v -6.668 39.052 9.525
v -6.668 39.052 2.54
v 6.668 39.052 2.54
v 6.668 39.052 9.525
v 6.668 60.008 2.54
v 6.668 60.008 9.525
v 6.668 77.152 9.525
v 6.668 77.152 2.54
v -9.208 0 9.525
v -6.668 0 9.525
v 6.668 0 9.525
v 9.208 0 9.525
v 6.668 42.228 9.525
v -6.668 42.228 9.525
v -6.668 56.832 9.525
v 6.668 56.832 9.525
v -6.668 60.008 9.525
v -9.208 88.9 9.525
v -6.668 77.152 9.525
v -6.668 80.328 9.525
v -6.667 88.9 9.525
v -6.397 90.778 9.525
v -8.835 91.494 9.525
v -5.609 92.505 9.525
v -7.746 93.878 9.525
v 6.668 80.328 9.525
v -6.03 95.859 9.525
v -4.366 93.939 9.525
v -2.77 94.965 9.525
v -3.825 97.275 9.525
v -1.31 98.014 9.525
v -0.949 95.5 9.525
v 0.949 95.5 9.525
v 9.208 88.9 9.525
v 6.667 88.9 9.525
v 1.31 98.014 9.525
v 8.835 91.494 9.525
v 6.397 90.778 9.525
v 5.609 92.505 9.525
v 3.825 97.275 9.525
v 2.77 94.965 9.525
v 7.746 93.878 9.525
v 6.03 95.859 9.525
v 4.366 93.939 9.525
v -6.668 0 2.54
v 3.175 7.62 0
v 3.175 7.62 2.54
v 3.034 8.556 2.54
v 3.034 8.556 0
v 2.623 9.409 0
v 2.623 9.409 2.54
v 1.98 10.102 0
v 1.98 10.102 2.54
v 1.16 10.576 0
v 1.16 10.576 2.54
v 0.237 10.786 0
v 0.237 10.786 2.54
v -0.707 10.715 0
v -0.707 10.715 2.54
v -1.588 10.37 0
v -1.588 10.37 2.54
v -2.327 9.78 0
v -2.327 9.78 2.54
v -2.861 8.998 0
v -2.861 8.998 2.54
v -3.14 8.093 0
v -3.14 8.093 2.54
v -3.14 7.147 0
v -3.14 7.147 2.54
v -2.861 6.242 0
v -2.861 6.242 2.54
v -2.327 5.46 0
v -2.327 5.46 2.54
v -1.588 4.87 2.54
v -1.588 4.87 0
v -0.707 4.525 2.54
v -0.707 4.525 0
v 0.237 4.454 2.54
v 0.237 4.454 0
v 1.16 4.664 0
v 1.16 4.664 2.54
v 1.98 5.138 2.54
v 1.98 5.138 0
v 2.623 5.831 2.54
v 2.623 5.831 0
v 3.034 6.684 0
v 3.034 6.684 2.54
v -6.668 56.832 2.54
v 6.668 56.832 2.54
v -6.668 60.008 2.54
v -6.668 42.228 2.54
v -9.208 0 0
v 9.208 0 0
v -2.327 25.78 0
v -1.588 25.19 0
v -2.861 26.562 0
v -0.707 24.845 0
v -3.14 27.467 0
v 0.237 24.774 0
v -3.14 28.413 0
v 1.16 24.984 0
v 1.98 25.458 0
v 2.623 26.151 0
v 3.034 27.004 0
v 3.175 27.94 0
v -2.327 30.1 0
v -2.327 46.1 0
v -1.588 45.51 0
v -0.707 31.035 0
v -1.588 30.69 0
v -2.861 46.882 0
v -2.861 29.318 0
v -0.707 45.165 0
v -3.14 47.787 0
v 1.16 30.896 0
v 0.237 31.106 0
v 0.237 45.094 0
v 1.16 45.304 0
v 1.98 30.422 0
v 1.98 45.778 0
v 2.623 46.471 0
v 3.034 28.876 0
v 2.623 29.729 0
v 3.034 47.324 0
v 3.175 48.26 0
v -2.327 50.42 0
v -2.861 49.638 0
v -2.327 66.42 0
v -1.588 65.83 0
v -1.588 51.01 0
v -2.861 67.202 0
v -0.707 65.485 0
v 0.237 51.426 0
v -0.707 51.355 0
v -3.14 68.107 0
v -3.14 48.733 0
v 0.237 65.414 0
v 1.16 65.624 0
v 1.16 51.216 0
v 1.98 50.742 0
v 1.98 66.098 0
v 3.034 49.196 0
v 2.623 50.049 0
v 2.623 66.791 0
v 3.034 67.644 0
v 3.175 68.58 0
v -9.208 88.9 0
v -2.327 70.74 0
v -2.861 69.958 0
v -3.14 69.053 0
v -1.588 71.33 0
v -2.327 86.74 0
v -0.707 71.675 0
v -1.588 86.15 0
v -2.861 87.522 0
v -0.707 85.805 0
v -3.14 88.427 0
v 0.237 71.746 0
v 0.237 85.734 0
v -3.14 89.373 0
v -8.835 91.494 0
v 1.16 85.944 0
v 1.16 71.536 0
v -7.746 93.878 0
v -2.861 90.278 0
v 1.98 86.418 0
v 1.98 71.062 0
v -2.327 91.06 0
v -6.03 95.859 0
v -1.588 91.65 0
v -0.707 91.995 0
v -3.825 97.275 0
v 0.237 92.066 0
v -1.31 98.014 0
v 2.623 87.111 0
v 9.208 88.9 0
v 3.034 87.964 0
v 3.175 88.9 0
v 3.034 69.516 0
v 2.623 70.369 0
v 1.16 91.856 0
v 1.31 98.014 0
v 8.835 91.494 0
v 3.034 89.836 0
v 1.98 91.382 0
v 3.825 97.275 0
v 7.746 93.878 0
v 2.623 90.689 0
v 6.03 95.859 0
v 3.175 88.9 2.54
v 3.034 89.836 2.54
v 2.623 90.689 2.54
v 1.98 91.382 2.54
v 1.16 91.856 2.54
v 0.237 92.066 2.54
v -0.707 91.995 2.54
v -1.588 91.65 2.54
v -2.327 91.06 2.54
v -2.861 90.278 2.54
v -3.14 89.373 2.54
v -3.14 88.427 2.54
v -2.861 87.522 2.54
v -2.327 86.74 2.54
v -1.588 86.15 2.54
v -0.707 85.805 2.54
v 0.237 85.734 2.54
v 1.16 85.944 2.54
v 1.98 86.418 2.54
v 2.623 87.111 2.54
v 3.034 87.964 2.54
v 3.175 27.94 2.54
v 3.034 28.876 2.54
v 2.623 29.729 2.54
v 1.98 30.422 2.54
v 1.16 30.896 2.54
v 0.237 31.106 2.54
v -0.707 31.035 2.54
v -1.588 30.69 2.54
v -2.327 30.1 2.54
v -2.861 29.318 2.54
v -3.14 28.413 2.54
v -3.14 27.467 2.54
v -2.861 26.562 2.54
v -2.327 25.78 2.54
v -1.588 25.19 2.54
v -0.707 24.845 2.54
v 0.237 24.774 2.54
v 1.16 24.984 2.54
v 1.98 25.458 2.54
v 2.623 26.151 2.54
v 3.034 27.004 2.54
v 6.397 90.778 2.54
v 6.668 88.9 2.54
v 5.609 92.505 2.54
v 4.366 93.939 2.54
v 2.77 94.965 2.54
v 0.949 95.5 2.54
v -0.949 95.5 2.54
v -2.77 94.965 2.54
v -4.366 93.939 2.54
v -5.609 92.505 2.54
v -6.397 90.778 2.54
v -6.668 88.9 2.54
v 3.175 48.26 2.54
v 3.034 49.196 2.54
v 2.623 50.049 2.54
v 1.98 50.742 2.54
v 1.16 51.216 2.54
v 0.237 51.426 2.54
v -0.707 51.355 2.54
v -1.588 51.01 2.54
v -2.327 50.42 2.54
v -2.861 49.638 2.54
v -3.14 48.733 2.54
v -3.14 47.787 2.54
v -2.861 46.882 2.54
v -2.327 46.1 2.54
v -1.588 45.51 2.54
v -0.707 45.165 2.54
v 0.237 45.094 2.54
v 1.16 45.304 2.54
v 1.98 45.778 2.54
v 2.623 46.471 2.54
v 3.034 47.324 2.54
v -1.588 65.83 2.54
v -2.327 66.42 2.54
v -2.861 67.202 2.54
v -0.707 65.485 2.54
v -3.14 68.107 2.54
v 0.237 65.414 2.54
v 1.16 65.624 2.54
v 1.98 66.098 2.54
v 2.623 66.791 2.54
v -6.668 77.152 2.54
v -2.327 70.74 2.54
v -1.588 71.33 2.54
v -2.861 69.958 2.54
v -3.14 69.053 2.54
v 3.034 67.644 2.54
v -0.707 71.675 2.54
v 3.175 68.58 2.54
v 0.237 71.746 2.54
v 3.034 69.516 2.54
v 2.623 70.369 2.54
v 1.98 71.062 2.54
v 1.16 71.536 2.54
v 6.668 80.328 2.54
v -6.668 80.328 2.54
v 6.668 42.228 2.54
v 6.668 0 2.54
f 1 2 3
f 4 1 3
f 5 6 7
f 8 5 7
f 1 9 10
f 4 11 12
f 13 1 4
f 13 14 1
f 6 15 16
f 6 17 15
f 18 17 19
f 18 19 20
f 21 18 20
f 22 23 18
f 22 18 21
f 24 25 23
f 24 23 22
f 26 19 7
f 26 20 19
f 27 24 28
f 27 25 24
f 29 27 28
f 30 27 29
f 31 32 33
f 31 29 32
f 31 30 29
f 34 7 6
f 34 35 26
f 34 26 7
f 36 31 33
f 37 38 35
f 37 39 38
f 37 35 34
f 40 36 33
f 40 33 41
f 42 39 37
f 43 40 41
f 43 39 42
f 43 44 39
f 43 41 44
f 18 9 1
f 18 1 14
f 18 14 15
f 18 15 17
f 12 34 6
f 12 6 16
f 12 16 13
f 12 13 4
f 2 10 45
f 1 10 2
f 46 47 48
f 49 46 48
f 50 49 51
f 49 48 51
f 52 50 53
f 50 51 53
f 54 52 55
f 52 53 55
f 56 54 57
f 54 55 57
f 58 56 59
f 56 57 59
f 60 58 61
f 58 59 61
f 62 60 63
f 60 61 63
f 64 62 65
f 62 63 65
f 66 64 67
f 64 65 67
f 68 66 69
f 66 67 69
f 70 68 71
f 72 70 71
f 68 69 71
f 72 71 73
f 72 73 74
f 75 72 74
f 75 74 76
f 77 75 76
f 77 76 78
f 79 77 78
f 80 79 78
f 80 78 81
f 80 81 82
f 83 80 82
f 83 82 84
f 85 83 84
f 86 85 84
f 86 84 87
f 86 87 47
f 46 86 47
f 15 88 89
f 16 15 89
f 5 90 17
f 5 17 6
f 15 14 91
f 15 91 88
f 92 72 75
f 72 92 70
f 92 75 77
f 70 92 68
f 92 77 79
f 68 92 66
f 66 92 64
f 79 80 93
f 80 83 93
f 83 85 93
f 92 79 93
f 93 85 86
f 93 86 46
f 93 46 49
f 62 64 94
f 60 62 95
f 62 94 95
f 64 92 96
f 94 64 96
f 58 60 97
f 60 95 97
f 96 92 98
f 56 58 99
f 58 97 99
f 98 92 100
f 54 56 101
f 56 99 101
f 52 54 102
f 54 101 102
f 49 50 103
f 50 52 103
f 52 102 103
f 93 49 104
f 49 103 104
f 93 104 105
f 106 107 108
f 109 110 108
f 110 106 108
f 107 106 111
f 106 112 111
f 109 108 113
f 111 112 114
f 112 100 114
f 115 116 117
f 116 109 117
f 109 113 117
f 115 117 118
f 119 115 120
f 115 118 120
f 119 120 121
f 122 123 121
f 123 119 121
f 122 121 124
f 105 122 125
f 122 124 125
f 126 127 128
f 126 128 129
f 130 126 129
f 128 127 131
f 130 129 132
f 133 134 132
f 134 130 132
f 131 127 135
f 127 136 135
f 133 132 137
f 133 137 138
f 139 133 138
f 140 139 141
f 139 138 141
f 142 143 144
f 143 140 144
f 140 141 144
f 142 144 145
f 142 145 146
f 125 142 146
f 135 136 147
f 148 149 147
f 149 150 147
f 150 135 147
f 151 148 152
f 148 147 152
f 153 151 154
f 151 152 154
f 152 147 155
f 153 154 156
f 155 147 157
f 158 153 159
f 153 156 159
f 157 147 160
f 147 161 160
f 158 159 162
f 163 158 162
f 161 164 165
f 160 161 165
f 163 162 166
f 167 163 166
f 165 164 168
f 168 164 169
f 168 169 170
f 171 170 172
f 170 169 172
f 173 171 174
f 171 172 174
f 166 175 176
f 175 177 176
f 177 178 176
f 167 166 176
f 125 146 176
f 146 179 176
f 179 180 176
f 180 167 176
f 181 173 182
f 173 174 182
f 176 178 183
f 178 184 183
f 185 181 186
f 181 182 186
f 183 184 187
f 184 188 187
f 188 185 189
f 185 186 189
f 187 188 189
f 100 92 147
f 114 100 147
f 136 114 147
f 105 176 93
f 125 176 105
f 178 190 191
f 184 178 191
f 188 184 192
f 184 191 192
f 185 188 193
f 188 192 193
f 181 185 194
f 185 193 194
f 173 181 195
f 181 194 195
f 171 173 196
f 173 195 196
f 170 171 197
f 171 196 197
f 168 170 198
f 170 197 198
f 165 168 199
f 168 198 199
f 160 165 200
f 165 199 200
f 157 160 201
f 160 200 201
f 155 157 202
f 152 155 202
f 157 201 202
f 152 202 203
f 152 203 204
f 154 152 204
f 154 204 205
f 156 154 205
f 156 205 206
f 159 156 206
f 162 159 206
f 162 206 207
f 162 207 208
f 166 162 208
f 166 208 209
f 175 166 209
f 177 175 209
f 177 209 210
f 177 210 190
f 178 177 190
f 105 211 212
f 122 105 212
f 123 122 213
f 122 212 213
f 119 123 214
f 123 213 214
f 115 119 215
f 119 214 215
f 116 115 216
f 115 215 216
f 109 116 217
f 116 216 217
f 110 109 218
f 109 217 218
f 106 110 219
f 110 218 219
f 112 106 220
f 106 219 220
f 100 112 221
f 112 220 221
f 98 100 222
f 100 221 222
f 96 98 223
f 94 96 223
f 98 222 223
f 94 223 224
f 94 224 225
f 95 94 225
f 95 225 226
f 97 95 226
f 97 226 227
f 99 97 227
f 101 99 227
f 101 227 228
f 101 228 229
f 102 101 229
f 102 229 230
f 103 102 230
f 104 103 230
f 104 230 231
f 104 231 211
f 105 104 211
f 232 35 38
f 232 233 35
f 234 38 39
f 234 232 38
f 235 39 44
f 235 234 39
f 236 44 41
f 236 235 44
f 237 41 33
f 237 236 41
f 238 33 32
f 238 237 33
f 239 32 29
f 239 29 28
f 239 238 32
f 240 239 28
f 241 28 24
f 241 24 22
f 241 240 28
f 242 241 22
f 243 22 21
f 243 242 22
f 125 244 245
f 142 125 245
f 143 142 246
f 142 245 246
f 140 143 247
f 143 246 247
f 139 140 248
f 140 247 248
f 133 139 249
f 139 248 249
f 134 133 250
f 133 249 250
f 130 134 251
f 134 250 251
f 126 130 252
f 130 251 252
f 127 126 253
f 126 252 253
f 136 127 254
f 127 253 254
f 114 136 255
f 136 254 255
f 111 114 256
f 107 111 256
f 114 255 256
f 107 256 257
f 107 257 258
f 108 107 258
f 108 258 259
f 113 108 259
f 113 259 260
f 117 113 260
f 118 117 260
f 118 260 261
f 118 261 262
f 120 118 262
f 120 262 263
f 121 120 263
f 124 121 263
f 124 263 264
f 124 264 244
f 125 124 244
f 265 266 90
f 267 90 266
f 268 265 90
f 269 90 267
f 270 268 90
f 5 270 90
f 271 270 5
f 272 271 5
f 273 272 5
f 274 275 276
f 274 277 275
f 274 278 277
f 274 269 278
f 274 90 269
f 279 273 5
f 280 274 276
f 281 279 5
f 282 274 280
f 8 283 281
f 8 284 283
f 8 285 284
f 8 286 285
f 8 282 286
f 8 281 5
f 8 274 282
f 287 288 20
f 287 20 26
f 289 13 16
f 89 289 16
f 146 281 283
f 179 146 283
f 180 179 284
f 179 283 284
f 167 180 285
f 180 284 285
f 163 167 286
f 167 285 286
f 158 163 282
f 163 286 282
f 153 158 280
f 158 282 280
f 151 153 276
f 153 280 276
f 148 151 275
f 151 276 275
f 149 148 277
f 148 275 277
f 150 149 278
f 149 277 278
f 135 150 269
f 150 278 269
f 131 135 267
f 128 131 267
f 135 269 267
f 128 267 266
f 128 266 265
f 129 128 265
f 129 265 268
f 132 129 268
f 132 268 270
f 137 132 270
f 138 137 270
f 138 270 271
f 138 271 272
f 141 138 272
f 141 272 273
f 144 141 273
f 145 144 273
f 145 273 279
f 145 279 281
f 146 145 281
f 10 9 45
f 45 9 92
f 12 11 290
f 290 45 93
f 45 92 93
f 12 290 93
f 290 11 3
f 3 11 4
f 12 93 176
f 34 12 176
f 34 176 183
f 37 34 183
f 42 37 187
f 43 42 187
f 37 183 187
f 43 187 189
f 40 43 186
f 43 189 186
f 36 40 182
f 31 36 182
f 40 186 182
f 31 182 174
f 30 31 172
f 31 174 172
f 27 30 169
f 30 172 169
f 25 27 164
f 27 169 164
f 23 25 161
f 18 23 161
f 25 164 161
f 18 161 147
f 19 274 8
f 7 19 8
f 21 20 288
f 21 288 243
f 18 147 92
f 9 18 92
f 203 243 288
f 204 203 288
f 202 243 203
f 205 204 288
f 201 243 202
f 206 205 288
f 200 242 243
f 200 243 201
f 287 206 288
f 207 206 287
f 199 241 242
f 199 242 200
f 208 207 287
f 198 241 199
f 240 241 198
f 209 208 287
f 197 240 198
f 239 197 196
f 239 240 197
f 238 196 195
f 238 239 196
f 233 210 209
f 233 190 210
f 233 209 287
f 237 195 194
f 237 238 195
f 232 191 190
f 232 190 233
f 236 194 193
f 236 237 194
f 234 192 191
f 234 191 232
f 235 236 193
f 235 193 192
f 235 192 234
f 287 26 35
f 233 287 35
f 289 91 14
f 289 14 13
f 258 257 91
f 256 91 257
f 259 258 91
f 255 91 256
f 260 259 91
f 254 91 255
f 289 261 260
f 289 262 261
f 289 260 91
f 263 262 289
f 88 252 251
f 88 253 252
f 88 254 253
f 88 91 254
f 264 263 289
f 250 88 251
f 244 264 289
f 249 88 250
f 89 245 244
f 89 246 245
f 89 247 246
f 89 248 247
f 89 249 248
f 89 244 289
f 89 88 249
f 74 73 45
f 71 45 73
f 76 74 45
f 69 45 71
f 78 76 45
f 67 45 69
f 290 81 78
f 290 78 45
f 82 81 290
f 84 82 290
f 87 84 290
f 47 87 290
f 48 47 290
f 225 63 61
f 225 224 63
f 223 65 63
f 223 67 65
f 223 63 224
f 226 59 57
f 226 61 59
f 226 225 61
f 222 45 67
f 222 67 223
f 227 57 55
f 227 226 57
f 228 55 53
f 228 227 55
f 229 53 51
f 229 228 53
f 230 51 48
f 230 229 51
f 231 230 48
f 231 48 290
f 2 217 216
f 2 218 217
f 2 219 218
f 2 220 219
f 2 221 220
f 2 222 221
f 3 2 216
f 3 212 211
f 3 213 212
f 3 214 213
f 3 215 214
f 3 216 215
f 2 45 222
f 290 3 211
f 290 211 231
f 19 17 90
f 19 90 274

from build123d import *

# Parameters (mm, degrees)
F1_DEPTH = 9.525
F2_T     = -2.54
F3_W     = 13.335
F3_H     = 2.54
F4_DEPTH = 6.985
F5_R     = 3.175
F6_DEPTH = 2.541
F7_W     = 13.335
F7_H     = 3.175
F8_DEPTH = 6.985


with BuildPart() as f1:
    # F0 (on Top) → F1 (new body)
    with BuildSketch(Plane.XY):
        with BuildLine():
            Line((-9.2075, 88.9), (-9.2075, 0))
            Line((-9.2075, 0), (9.2075, 0))
            Line((9.2075, 0), (9.2075, 88.9))
            ThreePointArc((9.2075, 88.9), (0, 98.1075), (-9.2075, 88.9))
        make_face()
    extrude(amount=F1_DEPTH)

    # F2
    f2_openings = [f1.faces().sort_by_distance(p)[0] for p in [
        (0, 48.087743, 9.525),
    ]]
    offset(amount=F2_T, openings=f2_openings)

    # F3 (on face) → F4 (cut, through all)
    with BuildSketch(Plane.XY.offset(9.525)):
        with Locations((0, 1.27)):
            Rectangle(F3_W, F3_H)
    extrude(amount=-F4_DEPTH, mode=Mode.SUBTRACT)

    # F5 (on face) → F6 (cut, through all)
    with BuildSketch(Plane.XY.offset(2.54)):
        with Locations((0, 88.9)):
            Circle(F5_R)
        with Locations((0, 68.58)):
            Circle(F5_R)
        with Locations((0, 48.26)):
            Circle(F5_R)
        with Locations((0, 27.94)):
            Circle(F5_R)
        with Locations((0, 7.62)):
            Circle(F5_R)
    extrude(amount=-F6_DEPTH, mode=Mode.SUBTRACT)

    # F7 (on face) → F8 (join, through all)
    with BuildSketch(Plane.XY.offset(2.54)):
        with Locations((0, 78.74)):
            Rectangle(F7_W, F7_H)
        with Locations((0, 58.42)):
            Rectangle(F7_W, F7_H)
        with Locations((0, 40.64)):
            Rectangle(F7_W, F7_H)
    extrude(amount=F8_DEPTH)


solid = f1.part
